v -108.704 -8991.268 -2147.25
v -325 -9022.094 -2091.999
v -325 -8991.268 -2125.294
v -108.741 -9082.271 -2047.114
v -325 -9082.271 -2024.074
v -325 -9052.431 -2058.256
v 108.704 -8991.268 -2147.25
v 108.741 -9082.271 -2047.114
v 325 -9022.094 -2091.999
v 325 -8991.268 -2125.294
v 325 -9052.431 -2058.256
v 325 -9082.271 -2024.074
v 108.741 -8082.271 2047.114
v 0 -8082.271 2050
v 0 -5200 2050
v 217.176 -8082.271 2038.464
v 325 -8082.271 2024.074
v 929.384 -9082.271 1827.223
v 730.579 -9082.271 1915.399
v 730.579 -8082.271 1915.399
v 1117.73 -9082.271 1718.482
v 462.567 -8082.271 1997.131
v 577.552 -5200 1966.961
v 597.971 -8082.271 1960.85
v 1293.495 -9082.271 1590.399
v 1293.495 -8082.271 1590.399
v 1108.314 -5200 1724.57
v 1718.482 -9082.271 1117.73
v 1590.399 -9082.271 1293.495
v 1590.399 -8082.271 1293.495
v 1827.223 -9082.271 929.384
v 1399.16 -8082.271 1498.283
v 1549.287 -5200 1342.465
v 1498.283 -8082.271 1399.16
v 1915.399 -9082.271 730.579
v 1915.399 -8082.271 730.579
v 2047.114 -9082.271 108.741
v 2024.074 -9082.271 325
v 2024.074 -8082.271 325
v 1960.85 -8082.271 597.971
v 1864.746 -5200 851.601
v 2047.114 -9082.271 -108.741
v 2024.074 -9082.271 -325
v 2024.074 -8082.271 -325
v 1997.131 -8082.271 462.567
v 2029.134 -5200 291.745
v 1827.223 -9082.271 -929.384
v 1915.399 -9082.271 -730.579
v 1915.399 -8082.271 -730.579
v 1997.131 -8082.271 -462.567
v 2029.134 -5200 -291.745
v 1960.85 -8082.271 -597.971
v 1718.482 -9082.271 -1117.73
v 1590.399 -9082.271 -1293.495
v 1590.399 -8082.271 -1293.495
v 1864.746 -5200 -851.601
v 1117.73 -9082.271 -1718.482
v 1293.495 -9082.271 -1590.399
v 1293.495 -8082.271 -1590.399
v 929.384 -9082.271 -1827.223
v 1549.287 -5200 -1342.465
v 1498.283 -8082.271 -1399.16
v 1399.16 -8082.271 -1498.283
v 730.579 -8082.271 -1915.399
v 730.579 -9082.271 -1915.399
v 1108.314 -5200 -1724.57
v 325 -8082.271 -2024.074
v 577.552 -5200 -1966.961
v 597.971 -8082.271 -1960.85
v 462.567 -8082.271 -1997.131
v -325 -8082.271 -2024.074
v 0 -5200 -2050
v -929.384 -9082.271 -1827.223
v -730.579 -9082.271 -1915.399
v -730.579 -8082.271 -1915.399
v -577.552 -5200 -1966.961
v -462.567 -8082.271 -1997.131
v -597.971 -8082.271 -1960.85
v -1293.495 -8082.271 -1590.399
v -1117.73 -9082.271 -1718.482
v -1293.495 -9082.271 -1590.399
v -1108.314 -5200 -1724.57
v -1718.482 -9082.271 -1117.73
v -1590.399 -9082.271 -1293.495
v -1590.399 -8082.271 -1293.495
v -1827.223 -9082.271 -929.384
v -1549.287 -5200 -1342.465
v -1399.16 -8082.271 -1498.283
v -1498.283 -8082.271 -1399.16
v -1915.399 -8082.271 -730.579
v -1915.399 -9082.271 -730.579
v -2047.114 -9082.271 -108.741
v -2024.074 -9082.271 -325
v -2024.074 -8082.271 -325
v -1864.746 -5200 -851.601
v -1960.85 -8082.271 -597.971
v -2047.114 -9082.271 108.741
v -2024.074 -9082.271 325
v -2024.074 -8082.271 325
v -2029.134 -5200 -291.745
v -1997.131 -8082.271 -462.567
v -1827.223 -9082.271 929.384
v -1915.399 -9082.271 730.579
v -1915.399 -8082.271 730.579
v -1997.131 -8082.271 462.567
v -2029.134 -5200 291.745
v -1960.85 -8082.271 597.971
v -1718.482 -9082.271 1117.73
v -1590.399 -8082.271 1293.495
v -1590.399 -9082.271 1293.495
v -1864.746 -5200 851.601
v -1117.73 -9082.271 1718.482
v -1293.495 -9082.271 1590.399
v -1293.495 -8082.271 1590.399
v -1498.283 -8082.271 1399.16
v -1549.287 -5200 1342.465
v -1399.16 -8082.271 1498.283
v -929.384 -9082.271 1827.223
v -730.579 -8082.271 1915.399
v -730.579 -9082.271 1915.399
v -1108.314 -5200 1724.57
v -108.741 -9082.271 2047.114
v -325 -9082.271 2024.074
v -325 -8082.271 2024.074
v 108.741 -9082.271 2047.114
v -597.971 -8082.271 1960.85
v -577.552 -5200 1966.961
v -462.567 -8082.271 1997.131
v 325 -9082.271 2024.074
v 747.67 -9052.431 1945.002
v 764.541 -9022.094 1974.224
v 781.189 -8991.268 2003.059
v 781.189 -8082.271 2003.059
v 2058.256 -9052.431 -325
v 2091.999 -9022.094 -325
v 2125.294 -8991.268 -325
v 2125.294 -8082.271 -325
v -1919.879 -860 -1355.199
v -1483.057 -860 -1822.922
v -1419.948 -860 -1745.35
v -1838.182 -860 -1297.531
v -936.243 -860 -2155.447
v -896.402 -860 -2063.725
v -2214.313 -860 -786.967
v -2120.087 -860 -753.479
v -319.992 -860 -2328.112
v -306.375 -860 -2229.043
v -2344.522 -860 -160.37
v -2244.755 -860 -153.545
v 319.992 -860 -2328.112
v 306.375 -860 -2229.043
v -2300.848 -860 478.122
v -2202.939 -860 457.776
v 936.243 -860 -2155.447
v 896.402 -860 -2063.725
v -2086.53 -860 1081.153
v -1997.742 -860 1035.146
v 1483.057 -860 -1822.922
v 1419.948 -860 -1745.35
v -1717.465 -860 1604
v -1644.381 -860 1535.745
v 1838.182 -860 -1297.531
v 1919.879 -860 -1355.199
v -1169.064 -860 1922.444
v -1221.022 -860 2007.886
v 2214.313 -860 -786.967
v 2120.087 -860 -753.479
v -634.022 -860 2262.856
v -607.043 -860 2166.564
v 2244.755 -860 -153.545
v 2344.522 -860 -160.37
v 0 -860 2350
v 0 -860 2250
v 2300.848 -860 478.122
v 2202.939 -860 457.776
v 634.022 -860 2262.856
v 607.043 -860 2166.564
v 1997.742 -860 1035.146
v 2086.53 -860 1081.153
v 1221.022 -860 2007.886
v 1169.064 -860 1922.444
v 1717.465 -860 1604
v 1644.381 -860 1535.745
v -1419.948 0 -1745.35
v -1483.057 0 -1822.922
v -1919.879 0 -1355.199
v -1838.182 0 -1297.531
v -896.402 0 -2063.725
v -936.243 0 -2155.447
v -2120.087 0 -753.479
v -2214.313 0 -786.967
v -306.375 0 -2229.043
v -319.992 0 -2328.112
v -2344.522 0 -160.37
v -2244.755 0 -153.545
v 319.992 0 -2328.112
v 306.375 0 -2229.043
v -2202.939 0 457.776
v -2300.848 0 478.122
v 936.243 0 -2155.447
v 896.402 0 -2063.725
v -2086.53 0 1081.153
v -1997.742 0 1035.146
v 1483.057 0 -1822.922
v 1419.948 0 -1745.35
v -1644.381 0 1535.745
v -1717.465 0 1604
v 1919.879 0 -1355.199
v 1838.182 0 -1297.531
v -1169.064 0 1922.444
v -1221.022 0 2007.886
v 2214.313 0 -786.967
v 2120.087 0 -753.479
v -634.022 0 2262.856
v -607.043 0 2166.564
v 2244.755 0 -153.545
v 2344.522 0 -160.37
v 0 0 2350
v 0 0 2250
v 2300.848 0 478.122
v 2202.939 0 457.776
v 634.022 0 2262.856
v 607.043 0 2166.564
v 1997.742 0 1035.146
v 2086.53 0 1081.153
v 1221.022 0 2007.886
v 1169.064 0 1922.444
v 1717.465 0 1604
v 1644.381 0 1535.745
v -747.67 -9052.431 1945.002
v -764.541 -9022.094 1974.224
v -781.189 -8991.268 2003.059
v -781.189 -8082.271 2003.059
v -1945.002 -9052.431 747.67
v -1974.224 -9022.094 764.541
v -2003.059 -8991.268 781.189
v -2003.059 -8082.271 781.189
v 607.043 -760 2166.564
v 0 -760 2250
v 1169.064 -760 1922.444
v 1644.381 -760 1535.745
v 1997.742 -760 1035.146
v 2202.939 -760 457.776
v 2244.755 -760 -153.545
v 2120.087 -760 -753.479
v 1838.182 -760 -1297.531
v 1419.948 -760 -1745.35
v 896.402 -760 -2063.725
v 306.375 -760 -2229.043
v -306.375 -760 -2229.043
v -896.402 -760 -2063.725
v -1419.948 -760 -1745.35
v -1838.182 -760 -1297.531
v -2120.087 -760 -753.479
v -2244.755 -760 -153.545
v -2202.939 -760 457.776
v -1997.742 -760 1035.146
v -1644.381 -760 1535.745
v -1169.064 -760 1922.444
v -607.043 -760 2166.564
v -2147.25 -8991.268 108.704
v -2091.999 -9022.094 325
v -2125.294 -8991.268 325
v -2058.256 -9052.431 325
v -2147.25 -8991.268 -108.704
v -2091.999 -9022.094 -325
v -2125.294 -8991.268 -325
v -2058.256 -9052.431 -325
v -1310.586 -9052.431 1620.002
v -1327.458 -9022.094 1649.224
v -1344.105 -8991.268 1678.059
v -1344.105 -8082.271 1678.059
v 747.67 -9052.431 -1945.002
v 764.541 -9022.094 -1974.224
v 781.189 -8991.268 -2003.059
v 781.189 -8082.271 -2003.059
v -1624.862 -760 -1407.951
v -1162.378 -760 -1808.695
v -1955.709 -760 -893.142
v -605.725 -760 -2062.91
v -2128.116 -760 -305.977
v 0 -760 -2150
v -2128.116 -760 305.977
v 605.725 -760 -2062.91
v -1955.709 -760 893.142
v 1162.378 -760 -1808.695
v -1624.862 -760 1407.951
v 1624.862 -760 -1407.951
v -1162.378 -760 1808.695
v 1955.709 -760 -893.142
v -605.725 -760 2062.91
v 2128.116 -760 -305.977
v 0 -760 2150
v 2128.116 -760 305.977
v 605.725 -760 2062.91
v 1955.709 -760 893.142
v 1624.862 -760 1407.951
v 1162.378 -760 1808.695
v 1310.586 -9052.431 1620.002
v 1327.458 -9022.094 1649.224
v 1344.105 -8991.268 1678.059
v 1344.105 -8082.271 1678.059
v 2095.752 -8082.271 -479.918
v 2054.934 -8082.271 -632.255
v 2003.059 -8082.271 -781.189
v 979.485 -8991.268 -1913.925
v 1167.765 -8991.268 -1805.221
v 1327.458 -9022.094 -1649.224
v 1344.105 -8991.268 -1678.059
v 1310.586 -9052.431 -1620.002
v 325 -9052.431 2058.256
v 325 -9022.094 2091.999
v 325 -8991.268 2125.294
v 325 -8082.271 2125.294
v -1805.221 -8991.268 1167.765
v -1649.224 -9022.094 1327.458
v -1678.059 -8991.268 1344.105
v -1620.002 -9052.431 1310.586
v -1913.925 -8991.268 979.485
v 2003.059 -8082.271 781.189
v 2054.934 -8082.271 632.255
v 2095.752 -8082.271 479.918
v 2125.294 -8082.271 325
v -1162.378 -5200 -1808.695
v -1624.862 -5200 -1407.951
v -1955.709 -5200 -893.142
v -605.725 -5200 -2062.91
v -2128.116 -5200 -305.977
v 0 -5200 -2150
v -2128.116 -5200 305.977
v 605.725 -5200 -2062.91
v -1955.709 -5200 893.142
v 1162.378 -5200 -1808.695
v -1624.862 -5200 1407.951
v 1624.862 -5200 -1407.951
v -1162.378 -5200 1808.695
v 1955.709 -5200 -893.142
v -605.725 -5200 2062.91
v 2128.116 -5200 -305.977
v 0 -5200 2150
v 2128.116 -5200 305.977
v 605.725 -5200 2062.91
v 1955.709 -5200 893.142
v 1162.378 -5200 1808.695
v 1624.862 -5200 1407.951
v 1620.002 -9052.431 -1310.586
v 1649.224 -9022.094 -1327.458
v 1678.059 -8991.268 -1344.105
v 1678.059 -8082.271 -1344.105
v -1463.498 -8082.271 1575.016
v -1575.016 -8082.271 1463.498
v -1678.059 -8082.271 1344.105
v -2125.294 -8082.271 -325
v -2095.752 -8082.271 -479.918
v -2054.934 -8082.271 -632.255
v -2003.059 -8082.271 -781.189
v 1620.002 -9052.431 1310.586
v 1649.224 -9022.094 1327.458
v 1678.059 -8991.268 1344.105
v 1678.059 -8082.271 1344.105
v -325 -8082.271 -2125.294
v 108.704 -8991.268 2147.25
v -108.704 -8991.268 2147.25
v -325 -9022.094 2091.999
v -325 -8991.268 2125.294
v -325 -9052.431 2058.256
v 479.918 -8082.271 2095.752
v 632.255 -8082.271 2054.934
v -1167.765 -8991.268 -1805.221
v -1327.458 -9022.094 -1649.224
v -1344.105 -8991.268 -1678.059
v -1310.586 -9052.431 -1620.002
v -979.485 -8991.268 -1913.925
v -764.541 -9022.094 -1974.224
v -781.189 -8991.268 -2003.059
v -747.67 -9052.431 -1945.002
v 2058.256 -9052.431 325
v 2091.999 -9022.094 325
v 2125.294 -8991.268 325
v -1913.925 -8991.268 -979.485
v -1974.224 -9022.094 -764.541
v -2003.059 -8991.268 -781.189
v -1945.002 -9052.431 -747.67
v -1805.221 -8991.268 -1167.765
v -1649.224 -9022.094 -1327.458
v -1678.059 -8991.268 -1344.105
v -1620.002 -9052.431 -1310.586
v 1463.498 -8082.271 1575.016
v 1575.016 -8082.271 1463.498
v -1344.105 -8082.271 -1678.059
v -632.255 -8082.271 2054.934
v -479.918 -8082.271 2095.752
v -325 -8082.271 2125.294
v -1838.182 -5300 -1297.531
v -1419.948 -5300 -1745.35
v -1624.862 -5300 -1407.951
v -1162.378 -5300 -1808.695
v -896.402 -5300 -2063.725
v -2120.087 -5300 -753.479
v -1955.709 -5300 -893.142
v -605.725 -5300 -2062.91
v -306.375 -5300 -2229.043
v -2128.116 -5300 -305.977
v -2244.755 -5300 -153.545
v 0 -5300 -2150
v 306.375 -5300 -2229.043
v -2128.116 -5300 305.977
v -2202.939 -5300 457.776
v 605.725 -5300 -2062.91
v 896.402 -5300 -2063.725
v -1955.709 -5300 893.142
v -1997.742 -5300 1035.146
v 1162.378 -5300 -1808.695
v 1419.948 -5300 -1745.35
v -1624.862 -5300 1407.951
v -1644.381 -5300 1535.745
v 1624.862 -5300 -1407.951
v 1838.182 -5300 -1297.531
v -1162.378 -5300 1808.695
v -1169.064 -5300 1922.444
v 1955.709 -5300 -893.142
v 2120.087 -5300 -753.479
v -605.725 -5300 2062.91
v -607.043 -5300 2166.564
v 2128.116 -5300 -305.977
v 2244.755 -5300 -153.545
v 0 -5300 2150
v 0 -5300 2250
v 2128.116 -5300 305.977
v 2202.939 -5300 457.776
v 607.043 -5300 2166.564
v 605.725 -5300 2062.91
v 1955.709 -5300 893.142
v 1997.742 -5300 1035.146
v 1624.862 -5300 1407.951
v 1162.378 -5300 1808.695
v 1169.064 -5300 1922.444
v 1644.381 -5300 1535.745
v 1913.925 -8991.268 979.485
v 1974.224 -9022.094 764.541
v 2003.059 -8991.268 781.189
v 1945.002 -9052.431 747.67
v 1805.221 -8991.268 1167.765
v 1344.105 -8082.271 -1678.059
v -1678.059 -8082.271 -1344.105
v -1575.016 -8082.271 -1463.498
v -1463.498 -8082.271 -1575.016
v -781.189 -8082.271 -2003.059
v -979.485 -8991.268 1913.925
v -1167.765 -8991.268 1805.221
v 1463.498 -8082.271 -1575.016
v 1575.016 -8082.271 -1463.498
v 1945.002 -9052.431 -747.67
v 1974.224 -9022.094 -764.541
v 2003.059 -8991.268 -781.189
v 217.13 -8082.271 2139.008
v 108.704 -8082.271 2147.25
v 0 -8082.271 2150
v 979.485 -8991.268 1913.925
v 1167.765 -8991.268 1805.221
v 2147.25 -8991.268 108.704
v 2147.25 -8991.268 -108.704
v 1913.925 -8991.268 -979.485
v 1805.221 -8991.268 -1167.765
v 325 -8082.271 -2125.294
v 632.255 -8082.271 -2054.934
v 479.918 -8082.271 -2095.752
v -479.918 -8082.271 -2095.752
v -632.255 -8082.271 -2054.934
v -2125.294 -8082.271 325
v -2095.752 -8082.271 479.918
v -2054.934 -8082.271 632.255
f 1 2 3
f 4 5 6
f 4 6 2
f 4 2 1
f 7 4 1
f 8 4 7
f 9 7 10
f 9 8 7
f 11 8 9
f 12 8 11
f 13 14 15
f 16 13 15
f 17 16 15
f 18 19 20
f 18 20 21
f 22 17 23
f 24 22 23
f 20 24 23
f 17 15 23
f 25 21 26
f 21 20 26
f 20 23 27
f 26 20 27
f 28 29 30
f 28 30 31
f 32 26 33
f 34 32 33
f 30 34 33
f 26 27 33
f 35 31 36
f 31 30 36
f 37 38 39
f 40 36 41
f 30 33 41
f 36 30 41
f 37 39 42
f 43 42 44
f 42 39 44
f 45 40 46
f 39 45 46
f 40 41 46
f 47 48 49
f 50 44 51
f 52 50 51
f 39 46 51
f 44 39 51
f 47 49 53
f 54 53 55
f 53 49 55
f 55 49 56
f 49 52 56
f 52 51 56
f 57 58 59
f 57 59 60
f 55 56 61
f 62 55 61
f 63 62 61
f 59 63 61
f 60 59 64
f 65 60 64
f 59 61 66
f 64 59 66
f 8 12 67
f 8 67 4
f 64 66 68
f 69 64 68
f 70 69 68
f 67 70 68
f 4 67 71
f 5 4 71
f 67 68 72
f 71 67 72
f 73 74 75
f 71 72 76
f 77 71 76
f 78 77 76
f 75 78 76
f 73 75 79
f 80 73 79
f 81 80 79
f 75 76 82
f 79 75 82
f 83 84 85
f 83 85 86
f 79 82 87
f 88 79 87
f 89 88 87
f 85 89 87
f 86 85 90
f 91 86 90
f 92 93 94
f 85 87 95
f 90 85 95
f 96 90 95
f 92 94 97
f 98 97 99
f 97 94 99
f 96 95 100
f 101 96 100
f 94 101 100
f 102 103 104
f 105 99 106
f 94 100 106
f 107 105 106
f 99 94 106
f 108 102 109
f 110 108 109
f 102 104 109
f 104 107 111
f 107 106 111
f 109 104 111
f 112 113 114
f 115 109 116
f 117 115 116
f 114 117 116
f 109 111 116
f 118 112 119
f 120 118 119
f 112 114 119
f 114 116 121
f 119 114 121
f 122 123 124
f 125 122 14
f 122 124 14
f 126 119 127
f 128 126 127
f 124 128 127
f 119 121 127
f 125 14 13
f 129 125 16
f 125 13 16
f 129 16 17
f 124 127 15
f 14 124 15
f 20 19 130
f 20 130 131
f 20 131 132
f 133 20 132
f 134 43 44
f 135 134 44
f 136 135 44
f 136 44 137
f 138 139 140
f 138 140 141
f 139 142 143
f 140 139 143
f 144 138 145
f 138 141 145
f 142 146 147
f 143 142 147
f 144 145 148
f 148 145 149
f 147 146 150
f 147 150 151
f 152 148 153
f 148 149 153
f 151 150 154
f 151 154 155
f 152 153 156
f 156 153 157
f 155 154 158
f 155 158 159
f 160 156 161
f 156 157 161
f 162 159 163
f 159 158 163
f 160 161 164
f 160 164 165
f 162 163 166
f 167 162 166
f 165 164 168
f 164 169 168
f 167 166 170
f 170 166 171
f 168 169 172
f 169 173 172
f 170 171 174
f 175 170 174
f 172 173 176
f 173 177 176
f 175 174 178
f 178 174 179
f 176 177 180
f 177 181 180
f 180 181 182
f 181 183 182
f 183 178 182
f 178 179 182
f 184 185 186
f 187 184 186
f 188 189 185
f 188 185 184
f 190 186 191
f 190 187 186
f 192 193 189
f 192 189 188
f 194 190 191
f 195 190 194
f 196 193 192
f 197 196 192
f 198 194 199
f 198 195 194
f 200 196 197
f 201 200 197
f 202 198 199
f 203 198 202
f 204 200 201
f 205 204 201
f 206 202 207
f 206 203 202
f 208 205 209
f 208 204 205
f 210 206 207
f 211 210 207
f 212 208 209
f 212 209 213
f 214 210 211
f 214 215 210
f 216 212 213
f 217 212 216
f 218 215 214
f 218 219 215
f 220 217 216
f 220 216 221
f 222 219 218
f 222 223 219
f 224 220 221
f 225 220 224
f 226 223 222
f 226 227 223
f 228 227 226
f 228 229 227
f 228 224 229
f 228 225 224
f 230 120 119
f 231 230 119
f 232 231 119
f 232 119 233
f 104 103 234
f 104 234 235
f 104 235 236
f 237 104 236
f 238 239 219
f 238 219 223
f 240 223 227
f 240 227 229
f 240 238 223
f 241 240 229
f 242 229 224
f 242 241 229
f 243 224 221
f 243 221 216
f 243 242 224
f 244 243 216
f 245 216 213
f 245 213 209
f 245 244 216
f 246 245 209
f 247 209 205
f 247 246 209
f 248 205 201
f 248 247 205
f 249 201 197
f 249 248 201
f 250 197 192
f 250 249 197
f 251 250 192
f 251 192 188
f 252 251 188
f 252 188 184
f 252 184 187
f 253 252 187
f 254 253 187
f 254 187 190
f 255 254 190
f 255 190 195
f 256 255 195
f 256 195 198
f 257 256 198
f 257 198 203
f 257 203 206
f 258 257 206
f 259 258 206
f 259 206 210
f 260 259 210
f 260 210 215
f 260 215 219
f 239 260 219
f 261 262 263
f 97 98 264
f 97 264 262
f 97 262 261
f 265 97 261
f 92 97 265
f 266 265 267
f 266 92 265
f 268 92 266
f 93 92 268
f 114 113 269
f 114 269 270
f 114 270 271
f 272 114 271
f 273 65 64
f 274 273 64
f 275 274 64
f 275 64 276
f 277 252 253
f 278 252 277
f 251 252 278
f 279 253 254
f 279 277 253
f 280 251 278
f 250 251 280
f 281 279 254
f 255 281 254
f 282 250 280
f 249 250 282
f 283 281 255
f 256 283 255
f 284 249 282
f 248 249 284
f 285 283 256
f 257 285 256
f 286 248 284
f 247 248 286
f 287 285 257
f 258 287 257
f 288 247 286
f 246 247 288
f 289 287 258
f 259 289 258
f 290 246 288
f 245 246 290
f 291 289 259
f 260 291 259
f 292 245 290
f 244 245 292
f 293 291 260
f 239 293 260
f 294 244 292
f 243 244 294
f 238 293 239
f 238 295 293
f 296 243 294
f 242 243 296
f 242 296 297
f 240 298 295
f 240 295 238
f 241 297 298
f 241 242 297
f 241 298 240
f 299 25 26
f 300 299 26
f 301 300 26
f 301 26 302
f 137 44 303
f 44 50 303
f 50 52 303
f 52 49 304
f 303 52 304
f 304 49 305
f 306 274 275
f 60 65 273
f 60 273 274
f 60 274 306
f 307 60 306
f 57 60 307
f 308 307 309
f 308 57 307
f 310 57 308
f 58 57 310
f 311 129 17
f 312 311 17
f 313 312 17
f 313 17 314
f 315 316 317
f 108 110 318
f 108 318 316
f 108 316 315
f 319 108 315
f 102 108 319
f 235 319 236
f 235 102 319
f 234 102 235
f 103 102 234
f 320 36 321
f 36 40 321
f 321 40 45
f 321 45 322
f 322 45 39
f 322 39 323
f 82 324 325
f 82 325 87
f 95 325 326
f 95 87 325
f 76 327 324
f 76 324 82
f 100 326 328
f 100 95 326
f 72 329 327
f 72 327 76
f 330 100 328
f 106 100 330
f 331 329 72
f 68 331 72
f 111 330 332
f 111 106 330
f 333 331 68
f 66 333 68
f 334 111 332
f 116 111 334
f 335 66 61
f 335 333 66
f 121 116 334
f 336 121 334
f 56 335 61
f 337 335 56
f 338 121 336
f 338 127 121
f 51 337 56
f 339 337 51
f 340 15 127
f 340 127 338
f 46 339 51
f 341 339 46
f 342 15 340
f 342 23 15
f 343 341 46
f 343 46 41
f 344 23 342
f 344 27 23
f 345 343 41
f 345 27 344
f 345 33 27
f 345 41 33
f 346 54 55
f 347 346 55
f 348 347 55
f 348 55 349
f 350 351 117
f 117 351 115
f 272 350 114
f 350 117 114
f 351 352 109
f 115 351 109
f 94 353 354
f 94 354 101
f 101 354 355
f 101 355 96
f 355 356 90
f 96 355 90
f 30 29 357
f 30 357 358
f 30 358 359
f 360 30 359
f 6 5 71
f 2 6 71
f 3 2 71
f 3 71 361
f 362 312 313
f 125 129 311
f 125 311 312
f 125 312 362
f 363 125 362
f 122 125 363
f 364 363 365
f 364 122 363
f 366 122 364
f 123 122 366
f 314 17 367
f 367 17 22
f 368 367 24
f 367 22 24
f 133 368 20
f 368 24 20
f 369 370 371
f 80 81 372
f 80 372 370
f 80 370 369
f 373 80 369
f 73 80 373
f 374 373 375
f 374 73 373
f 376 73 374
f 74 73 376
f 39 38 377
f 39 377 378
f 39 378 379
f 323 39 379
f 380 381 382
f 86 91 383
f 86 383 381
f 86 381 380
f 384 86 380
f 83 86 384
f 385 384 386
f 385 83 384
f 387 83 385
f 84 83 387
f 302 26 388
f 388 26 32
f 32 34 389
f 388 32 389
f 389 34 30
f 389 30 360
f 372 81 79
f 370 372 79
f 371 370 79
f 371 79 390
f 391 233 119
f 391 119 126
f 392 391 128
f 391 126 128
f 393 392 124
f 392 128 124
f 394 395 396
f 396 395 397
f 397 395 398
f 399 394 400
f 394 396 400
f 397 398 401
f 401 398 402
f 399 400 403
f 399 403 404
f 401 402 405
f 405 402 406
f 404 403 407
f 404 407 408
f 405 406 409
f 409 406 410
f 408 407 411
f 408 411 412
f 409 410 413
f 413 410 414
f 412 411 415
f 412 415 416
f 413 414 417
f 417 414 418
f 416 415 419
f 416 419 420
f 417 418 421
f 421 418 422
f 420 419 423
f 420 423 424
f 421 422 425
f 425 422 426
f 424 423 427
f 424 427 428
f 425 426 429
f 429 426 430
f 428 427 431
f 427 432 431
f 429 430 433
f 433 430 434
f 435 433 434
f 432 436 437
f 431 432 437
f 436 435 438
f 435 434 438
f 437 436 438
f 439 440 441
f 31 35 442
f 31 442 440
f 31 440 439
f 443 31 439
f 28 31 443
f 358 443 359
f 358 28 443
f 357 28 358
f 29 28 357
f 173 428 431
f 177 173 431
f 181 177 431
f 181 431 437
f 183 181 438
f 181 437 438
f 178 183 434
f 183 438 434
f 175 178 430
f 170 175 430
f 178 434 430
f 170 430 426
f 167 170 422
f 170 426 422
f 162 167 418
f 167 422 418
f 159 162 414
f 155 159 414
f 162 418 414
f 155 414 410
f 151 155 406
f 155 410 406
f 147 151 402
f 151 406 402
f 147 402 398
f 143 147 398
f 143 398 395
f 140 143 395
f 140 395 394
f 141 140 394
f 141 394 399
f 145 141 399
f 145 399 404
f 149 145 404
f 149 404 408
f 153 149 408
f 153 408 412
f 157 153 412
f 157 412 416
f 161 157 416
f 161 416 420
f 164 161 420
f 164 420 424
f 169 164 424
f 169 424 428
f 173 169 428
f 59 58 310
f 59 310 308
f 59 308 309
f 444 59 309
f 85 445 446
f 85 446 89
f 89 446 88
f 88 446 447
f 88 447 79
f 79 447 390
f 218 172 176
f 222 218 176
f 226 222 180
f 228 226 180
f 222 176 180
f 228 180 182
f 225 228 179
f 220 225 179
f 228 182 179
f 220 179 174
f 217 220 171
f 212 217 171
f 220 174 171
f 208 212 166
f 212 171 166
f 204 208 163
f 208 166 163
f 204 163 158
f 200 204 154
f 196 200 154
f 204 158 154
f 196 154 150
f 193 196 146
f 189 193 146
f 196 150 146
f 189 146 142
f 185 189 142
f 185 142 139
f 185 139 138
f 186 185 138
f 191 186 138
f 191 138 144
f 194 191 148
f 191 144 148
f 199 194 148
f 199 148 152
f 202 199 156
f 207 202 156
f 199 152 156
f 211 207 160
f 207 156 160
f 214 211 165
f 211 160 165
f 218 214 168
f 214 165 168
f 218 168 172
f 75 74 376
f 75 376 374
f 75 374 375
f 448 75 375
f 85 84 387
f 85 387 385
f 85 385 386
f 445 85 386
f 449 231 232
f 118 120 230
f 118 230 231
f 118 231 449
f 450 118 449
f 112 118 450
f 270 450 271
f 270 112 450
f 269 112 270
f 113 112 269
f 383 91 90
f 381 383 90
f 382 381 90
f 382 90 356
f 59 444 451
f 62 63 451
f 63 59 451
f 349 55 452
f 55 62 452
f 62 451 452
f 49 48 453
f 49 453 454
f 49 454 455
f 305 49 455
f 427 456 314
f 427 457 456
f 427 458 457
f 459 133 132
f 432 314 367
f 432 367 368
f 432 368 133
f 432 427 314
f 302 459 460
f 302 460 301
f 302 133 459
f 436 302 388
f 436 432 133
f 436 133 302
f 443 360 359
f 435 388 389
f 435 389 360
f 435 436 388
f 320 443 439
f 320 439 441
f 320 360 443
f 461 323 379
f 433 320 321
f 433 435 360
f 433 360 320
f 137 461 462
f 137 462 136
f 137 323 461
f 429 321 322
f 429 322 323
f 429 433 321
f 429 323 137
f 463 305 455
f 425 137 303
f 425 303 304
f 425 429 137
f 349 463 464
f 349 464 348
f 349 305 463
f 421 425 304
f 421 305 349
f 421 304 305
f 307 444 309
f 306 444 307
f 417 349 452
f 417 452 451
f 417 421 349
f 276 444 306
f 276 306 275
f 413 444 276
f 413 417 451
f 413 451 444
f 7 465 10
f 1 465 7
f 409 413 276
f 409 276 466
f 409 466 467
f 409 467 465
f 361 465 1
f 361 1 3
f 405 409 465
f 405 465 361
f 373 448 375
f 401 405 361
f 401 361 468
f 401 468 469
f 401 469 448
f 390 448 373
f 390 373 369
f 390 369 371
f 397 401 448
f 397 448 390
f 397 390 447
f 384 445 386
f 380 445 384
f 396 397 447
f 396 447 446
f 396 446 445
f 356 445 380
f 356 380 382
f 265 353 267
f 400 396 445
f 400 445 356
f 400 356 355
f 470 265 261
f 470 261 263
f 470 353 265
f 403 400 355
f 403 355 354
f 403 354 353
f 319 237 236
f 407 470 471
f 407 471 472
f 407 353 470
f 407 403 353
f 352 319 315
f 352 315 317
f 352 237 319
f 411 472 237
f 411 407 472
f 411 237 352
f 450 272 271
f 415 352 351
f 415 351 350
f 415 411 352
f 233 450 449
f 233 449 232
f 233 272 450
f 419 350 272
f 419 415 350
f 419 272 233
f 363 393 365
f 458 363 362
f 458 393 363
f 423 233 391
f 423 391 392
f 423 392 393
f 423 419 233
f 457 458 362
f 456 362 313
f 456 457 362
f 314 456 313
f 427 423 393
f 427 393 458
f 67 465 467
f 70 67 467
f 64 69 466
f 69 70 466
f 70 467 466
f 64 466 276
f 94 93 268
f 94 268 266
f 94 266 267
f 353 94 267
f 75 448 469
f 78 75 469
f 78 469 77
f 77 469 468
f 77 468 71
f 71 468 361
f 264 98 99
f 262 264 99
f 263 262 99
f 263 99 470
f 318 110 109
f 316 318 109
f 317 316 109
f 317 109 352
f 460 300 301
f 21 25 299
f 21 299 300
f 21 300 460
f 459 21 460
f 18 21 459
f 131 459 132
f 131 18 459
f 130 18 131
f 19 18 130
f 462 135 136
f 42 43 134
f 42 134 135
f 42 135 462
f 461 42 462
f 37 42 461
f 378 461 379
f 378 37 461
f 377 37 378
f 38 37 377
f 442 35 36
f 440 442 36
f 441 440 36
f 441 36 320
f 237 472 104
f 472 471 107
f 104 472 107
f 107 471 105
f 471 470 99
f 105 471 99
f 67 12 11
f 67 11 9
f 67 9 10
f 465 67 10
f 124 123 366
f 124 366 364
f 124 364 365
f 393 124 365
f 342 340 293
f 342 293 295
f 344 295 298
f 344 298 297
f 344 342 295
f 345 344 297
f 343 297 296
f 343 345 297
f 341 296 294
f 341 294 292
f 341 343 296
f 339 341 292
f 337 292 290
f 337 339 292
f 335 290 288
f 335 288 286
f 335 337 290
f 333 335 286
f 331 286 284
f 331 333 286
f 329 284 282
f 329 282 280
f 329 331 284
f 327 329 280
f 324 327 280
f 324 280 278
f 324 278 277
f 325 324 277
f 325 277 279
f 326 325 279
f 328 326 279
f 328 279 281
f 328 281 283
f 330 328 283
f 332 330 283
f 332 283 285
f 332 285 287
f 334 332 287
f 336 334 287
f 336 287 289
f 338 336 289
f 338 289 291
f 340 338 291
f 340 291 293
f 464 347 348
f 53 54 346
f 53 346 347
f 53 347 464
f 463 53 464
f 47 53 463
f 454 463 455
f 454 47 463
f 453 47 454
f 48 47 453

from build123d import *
from build123d.topology import SkipClean

# Parameters (mm, degrees)
REVOLVE_1_ANGLE          = 180
SHELL_1_T                = -150
CUT_EXTRUDE_1_DEPTH      = 18660.782956937
EXTRUDE_1_REACH          = 14147.141
EXTRUDE_1_END_RADIUS     = 3120.833333333
SKETCH_3_R               = 2150
SKETCH_3_R_2             = 2050
SKETCH_4_R               = 3482.688790768
SKETCH_4_W               = 650
SKETCH_4_H               = 200
CUT_EXTRUDE_2_DEPTH      = 4190.568828001
PATTERN_CIRCULAR_2_COUNT = 12
EXTRUDE_2_DEPTH          = 4440
EXTRUDE_2_DEPTH_BACK     = 100
SKETCH_5_R               = 2250
SKETCH_5_R_2             = 2150
EXTRUDE_3_DEPTH          = 760
EXTRUDE_3_DEPTH_BACK     = 100
SKETCH_6_R               = 2350
SKETCH_6_R_2             = 2250


# Read off the part's stored shape, not the designer's step: 交差2
with BuildPart() as part:
    # ｽｹｯﾁ1 → 回転1 (revolve)
    with BuildSketch(Plane.XY):
        with BuildLine():
            Line((2750, 8400), (2750, -8500))
            ThreePointArc((2750, -8500), (1566.245510768, -9600.616769741), (0, -10000))
            Line((0, -10000), (0, 8400))
            Line((0, 8400), (2750, 8400))
        make_face()
    revolve(axis=Axis((0, 8400, 0), (0, -1, 0)), revolution_arc=REVOLVE_1_ANGLE)

    # ｼｪﾙ1
    shell_1_openings = [part.faces().sort_by_distance(p)[0] for p in [
        (0, -583.603631578, 0),
    ]]
    offset(amount=SHELL_1_T, openings=shell_1_openings)

    # ｽｹｯﾁ2 → ｶｯﾄ - 押し出し1 (cut, through all)
    with BuildSketch(Plane.XZ.offset(-8250)):
        with BuildLine():
            Line((-2600, 0), (2600, 0))
            ThreePointArc((2600, 0), (0, 2600), (-2600, 0))
        make_face()
    extrude(amount=-CUT_EXTRUDE_1_DEPTH, mode=Mode.SUBTRACT)

    # ﾐﾗｰ1: part across plane


with BuildPart() as part_1:
    with SkipClean():  # the faces are left unmerged after this step: merging them gives an invalid solid
        add(part.part)
        add(part.part.mirror(Plane.XY))


with BuildPart() as body_2:
    # ﾎﾞｽ - 押し出し1: up to this sphere (the profile starts inside it)
    extrude_1_end = Location((0, -6729.166666667, 0)) * Sphere(EXTRUDE_1_END_RADIUS, mode=Mode.PRIVATE)
    # ｽｹｯﾁ3 → ﾎﾞｽ - 押し出し1 (new, up to the surface)
    with BuildSketch(Plane(origin=(0, -5200, 0), x_dir=(1, 0, 0), z_dir=(0, 1, 0)), mode=Mode.PRIVATE) as extrude_1_sk1:
        with Locations(Location((0, 0, 0), (0, 0, 270))):
            Circle(SKETCH_3_R)
        with Locations(Location((0, 0, 0), (0, 0, 270))):
            Circle(SKETCH_3_R_2, mode=Mode.SUBTRACT)
    extrude_1_tool1 = extrude(extrude_1_sk1.sketch, amount=-EXTRUDE_1_REACH, mode=Mode.PRIVATE) & extrude_1_end
    add(extrude_1_tool1.solids().sort_by_distance((0, -5200, -2089.188817))[0])


with BuildPart() as body_2_2:
    # 交差2: the piece on the far side of the plane
    add(body_2.part)
    split(bisect_by=Plane(origin=(0, -8082.271146804, 0), x_dir=(1, 0, 0), z_dir=(0, 1, 0)), keep=Keep.BOTTOM)

    # ｽｹｯﾁ4 → ｶｯﾄ - 押し出し2 (cut, through all)
    with BuildSketch(Plane(origin=(0, -8082.271146804, 0), x_dir=(1, 0, 0), z_dir=(0, 1, 0))):
        Circle(SKETCH_4_R)
        with Locations((0, 2050)):
            Rectangle(SKETCH_4_W, SKETCH_4_H, mode=Mode.SUBTRACT)
    extrude(amount=-CUT_EXTRUDE_2_DEPTH, mode=Mode.SUBTRACT)


with BuildPart() as body_2_1:
    add(body_2.part)

    # 交差2
    split(bisect_by=Plane(origin=(0, -8082.271146804, 0), x_dir=(1, 0, 0), z_dir=(0, 1, 0)), keep=Keep.TOP)


with BuildPart() as pattern_circular_2_1:
    # 円形ﾊﾟﾀｰﾝ2: pattern copy
    add(body_2_2.part.rotate(Axis((0, 0, 0), (0, 1, 0)), 1 * 360 / PATTERN_CIRCULAR_2_COUNT))


with BuildPart() as pattern_circular_2_2:
    # 円形ﾊﾟﾀｰﾝ2: pattern copy
    add(body_2_2.part.rotate(Axis((0, 0, 0), (0, 1, 0)), 2 * 360 / PATTERN_CIRCULAR_2_COUNT))


with BuildPart() as pattern_circular_2_3:
    # 円形ﾊﾟﾀｰﾝ2: pattern copy
    add(body_2_2.part.rotate(Axis((0, 0, 0), (0, 1, 0)), 3 * 360 / PATTERN_CIRCULAR_2_COUNT))


with BuildPart() as pattern_circular_2_4:
    # 円形ﾊﾟﾀｰﾝ2: pattern copy
    add(body_2_2.part.rotate(Axis((0, 0, 0), (0, 1, 0)), 4 * 360 / PATTERN_CIRCULAR_2_COUNT))


with BuildPart() as pattern_circular_2_5:
    # 円形ﾊﾟﾀｰﾝ2: pattern copy
    add(body_2_2.part.rotate(Axis((0, 0, 0), (0, 1, 0)), 5 * 360 / PATTERN_CIRCULAR_2_COUNT))


with BuildPart() as pattern_circular_2_6:
    # 円形ﾊﾟﾀｰﾝ2: pattern copy
    add(body_2_2.part.rotate(Axis((0, 0, 0), (0, 1, 0)), 6 * 360 / PATTERN_CIRCULAR_2_COUNT))


with BuildPart() as pattern_circular_2_7:
    # 円形ﾊﾟﾀｰﾝ2: pattern copy
    add(body_2_2.part.rotate(Axis((0, 0, 0), (0, 1, 0)), 7 * 360 / PATTERN_CIRCULAR_2_COUNT))


with BuildPart() as pattern_circular_2_8:
    # 円形ﾊﾟﾀｰﾝ2: pattern copy
    add(body_2_2.part.rotate(Axis((0, 0, 0), (0, 1, 0)), 8 * 360 / PATTERN_CIRCULAR_2_COUNT))


with BuildPart() as pattern_circular_2_9:
    # 円形ﾊﾟﾀｰﾝ2: pattern copy
    add(body_2_2.part.rotate(Axis((0, 0, 0), (0, 1, 0)), 9 * 360 / PATTERN_CIRCULAR_2_COUNT))


with BuildPart() as pattern_circular_2_10:
    # 円形ﾊﾟﾀｰﾝ2: pattern copy
    add(body_2_2.part.rotate(Axis((0, 0, 0), (0, 1, 0)), 10 * 360 / PATTERN_CIRCULAR_2_COUNT))


with BuildPart() as pattern_circular_2_11:
    # 円形ﾊﾟﾀｰﾝ2: pattern copy
    add(body_2_2.part.rotate(Axis((0, 0, 0), (0, 1, 0)), 11 * 360 / PATTERN_CIRCULAR_2_COUNT))


with BuildPart() as body_2_2_1:
    add(body_2_2.part)

    # Combine 2: union 円形ﾊﾟﾀｰﾝ2_11, 円形ﾊﾟﾀｰﾝ2_10, 円形ﾊﾟﾀｰﾝ2_9, 円形ﾊﾟﾀｰﾝ2_8, 円形ﾊﾟﾀｰﾝ2_7, 円形ﾊﾟﾀｰﾝ2_6, 円形ﾊﾟﾀｰﾝ2_5, 円形ﾊﾟﾀｰﾝ2_4, 円形ﾊﾟﾀｰﾝ2_3, 円形ﾊﾟﾀｰﾝ2_2, 円形ﾊﾟﾀｰﾝ2_1, body 2
    add(pattern_circular_2_11.part)
    add(pattern_circular_2_10.part)
    add(pattern_circular_2_9.part)
    add(pattern_circular_2_8.part)
    add(pattern_circular_2_7.part)
    add(pattern_circular_2_6.part)
    add(pattern_circular_2_5.part)
    add(pattern_circular_2_4.part)
    add(pattern_circular_2_3.part)
    add(pattern_circular_2_2.part)
    add(pattern_circular_2_1.part)
    add(body_2_1.part)

    # ｽｹｯﾁ5 → ﾎﾞｽ - 押し出し2 (add, two sides: drawn at the far end of the back side and taken through both)
    with BuildSketch(Plane(origin=(0, -5200, 0), x_dir=(1, 0, 0), z_dir=(0, 1, 0)).offset(-EXTRUDE_2_DEPTH_BACK)):
        with Locations(Location((0, 0, 0), (0, 0, 270))):
            Circle(SKETCH_5_R)
        with Locations(Location((0, 0, 0), (0, 0, 270))):
            Circle(SKETCH_5_R_2, mode=Mode.SUBTRACT)
    extrude(amount=EXTRUDE_2_DEPTH + EXTRUDE_2_DEPTH_BACK)

    # ｽｹｯﾁ6 → ﾎﾞｽ - 押し出し3 (add, two sides: drawn at the far end of the back side and taken through both)
    with BuildSketch(Plane(origin=(0, -760, 0), x_dir=(1, 0, 0), z_dir=(0, 1, 0)).offset(-EXTRUDE_3_DEPTH_BACK)):
        with Locations(Location((0, 0, 0), (0, 0, 270))):
            Circle(SKETCH_6_R)
        with Locations(Location((0, 0, 0), (0, 0, 270))):
            Circle(SKETCH_6_R_2, mode=Mode.SUBTRACT)
    extrude(amount=EXTRUDE_3_DEPTH + EXTRUDE_3_DEPTH_BACK)


solid = body_2_2_1.part
